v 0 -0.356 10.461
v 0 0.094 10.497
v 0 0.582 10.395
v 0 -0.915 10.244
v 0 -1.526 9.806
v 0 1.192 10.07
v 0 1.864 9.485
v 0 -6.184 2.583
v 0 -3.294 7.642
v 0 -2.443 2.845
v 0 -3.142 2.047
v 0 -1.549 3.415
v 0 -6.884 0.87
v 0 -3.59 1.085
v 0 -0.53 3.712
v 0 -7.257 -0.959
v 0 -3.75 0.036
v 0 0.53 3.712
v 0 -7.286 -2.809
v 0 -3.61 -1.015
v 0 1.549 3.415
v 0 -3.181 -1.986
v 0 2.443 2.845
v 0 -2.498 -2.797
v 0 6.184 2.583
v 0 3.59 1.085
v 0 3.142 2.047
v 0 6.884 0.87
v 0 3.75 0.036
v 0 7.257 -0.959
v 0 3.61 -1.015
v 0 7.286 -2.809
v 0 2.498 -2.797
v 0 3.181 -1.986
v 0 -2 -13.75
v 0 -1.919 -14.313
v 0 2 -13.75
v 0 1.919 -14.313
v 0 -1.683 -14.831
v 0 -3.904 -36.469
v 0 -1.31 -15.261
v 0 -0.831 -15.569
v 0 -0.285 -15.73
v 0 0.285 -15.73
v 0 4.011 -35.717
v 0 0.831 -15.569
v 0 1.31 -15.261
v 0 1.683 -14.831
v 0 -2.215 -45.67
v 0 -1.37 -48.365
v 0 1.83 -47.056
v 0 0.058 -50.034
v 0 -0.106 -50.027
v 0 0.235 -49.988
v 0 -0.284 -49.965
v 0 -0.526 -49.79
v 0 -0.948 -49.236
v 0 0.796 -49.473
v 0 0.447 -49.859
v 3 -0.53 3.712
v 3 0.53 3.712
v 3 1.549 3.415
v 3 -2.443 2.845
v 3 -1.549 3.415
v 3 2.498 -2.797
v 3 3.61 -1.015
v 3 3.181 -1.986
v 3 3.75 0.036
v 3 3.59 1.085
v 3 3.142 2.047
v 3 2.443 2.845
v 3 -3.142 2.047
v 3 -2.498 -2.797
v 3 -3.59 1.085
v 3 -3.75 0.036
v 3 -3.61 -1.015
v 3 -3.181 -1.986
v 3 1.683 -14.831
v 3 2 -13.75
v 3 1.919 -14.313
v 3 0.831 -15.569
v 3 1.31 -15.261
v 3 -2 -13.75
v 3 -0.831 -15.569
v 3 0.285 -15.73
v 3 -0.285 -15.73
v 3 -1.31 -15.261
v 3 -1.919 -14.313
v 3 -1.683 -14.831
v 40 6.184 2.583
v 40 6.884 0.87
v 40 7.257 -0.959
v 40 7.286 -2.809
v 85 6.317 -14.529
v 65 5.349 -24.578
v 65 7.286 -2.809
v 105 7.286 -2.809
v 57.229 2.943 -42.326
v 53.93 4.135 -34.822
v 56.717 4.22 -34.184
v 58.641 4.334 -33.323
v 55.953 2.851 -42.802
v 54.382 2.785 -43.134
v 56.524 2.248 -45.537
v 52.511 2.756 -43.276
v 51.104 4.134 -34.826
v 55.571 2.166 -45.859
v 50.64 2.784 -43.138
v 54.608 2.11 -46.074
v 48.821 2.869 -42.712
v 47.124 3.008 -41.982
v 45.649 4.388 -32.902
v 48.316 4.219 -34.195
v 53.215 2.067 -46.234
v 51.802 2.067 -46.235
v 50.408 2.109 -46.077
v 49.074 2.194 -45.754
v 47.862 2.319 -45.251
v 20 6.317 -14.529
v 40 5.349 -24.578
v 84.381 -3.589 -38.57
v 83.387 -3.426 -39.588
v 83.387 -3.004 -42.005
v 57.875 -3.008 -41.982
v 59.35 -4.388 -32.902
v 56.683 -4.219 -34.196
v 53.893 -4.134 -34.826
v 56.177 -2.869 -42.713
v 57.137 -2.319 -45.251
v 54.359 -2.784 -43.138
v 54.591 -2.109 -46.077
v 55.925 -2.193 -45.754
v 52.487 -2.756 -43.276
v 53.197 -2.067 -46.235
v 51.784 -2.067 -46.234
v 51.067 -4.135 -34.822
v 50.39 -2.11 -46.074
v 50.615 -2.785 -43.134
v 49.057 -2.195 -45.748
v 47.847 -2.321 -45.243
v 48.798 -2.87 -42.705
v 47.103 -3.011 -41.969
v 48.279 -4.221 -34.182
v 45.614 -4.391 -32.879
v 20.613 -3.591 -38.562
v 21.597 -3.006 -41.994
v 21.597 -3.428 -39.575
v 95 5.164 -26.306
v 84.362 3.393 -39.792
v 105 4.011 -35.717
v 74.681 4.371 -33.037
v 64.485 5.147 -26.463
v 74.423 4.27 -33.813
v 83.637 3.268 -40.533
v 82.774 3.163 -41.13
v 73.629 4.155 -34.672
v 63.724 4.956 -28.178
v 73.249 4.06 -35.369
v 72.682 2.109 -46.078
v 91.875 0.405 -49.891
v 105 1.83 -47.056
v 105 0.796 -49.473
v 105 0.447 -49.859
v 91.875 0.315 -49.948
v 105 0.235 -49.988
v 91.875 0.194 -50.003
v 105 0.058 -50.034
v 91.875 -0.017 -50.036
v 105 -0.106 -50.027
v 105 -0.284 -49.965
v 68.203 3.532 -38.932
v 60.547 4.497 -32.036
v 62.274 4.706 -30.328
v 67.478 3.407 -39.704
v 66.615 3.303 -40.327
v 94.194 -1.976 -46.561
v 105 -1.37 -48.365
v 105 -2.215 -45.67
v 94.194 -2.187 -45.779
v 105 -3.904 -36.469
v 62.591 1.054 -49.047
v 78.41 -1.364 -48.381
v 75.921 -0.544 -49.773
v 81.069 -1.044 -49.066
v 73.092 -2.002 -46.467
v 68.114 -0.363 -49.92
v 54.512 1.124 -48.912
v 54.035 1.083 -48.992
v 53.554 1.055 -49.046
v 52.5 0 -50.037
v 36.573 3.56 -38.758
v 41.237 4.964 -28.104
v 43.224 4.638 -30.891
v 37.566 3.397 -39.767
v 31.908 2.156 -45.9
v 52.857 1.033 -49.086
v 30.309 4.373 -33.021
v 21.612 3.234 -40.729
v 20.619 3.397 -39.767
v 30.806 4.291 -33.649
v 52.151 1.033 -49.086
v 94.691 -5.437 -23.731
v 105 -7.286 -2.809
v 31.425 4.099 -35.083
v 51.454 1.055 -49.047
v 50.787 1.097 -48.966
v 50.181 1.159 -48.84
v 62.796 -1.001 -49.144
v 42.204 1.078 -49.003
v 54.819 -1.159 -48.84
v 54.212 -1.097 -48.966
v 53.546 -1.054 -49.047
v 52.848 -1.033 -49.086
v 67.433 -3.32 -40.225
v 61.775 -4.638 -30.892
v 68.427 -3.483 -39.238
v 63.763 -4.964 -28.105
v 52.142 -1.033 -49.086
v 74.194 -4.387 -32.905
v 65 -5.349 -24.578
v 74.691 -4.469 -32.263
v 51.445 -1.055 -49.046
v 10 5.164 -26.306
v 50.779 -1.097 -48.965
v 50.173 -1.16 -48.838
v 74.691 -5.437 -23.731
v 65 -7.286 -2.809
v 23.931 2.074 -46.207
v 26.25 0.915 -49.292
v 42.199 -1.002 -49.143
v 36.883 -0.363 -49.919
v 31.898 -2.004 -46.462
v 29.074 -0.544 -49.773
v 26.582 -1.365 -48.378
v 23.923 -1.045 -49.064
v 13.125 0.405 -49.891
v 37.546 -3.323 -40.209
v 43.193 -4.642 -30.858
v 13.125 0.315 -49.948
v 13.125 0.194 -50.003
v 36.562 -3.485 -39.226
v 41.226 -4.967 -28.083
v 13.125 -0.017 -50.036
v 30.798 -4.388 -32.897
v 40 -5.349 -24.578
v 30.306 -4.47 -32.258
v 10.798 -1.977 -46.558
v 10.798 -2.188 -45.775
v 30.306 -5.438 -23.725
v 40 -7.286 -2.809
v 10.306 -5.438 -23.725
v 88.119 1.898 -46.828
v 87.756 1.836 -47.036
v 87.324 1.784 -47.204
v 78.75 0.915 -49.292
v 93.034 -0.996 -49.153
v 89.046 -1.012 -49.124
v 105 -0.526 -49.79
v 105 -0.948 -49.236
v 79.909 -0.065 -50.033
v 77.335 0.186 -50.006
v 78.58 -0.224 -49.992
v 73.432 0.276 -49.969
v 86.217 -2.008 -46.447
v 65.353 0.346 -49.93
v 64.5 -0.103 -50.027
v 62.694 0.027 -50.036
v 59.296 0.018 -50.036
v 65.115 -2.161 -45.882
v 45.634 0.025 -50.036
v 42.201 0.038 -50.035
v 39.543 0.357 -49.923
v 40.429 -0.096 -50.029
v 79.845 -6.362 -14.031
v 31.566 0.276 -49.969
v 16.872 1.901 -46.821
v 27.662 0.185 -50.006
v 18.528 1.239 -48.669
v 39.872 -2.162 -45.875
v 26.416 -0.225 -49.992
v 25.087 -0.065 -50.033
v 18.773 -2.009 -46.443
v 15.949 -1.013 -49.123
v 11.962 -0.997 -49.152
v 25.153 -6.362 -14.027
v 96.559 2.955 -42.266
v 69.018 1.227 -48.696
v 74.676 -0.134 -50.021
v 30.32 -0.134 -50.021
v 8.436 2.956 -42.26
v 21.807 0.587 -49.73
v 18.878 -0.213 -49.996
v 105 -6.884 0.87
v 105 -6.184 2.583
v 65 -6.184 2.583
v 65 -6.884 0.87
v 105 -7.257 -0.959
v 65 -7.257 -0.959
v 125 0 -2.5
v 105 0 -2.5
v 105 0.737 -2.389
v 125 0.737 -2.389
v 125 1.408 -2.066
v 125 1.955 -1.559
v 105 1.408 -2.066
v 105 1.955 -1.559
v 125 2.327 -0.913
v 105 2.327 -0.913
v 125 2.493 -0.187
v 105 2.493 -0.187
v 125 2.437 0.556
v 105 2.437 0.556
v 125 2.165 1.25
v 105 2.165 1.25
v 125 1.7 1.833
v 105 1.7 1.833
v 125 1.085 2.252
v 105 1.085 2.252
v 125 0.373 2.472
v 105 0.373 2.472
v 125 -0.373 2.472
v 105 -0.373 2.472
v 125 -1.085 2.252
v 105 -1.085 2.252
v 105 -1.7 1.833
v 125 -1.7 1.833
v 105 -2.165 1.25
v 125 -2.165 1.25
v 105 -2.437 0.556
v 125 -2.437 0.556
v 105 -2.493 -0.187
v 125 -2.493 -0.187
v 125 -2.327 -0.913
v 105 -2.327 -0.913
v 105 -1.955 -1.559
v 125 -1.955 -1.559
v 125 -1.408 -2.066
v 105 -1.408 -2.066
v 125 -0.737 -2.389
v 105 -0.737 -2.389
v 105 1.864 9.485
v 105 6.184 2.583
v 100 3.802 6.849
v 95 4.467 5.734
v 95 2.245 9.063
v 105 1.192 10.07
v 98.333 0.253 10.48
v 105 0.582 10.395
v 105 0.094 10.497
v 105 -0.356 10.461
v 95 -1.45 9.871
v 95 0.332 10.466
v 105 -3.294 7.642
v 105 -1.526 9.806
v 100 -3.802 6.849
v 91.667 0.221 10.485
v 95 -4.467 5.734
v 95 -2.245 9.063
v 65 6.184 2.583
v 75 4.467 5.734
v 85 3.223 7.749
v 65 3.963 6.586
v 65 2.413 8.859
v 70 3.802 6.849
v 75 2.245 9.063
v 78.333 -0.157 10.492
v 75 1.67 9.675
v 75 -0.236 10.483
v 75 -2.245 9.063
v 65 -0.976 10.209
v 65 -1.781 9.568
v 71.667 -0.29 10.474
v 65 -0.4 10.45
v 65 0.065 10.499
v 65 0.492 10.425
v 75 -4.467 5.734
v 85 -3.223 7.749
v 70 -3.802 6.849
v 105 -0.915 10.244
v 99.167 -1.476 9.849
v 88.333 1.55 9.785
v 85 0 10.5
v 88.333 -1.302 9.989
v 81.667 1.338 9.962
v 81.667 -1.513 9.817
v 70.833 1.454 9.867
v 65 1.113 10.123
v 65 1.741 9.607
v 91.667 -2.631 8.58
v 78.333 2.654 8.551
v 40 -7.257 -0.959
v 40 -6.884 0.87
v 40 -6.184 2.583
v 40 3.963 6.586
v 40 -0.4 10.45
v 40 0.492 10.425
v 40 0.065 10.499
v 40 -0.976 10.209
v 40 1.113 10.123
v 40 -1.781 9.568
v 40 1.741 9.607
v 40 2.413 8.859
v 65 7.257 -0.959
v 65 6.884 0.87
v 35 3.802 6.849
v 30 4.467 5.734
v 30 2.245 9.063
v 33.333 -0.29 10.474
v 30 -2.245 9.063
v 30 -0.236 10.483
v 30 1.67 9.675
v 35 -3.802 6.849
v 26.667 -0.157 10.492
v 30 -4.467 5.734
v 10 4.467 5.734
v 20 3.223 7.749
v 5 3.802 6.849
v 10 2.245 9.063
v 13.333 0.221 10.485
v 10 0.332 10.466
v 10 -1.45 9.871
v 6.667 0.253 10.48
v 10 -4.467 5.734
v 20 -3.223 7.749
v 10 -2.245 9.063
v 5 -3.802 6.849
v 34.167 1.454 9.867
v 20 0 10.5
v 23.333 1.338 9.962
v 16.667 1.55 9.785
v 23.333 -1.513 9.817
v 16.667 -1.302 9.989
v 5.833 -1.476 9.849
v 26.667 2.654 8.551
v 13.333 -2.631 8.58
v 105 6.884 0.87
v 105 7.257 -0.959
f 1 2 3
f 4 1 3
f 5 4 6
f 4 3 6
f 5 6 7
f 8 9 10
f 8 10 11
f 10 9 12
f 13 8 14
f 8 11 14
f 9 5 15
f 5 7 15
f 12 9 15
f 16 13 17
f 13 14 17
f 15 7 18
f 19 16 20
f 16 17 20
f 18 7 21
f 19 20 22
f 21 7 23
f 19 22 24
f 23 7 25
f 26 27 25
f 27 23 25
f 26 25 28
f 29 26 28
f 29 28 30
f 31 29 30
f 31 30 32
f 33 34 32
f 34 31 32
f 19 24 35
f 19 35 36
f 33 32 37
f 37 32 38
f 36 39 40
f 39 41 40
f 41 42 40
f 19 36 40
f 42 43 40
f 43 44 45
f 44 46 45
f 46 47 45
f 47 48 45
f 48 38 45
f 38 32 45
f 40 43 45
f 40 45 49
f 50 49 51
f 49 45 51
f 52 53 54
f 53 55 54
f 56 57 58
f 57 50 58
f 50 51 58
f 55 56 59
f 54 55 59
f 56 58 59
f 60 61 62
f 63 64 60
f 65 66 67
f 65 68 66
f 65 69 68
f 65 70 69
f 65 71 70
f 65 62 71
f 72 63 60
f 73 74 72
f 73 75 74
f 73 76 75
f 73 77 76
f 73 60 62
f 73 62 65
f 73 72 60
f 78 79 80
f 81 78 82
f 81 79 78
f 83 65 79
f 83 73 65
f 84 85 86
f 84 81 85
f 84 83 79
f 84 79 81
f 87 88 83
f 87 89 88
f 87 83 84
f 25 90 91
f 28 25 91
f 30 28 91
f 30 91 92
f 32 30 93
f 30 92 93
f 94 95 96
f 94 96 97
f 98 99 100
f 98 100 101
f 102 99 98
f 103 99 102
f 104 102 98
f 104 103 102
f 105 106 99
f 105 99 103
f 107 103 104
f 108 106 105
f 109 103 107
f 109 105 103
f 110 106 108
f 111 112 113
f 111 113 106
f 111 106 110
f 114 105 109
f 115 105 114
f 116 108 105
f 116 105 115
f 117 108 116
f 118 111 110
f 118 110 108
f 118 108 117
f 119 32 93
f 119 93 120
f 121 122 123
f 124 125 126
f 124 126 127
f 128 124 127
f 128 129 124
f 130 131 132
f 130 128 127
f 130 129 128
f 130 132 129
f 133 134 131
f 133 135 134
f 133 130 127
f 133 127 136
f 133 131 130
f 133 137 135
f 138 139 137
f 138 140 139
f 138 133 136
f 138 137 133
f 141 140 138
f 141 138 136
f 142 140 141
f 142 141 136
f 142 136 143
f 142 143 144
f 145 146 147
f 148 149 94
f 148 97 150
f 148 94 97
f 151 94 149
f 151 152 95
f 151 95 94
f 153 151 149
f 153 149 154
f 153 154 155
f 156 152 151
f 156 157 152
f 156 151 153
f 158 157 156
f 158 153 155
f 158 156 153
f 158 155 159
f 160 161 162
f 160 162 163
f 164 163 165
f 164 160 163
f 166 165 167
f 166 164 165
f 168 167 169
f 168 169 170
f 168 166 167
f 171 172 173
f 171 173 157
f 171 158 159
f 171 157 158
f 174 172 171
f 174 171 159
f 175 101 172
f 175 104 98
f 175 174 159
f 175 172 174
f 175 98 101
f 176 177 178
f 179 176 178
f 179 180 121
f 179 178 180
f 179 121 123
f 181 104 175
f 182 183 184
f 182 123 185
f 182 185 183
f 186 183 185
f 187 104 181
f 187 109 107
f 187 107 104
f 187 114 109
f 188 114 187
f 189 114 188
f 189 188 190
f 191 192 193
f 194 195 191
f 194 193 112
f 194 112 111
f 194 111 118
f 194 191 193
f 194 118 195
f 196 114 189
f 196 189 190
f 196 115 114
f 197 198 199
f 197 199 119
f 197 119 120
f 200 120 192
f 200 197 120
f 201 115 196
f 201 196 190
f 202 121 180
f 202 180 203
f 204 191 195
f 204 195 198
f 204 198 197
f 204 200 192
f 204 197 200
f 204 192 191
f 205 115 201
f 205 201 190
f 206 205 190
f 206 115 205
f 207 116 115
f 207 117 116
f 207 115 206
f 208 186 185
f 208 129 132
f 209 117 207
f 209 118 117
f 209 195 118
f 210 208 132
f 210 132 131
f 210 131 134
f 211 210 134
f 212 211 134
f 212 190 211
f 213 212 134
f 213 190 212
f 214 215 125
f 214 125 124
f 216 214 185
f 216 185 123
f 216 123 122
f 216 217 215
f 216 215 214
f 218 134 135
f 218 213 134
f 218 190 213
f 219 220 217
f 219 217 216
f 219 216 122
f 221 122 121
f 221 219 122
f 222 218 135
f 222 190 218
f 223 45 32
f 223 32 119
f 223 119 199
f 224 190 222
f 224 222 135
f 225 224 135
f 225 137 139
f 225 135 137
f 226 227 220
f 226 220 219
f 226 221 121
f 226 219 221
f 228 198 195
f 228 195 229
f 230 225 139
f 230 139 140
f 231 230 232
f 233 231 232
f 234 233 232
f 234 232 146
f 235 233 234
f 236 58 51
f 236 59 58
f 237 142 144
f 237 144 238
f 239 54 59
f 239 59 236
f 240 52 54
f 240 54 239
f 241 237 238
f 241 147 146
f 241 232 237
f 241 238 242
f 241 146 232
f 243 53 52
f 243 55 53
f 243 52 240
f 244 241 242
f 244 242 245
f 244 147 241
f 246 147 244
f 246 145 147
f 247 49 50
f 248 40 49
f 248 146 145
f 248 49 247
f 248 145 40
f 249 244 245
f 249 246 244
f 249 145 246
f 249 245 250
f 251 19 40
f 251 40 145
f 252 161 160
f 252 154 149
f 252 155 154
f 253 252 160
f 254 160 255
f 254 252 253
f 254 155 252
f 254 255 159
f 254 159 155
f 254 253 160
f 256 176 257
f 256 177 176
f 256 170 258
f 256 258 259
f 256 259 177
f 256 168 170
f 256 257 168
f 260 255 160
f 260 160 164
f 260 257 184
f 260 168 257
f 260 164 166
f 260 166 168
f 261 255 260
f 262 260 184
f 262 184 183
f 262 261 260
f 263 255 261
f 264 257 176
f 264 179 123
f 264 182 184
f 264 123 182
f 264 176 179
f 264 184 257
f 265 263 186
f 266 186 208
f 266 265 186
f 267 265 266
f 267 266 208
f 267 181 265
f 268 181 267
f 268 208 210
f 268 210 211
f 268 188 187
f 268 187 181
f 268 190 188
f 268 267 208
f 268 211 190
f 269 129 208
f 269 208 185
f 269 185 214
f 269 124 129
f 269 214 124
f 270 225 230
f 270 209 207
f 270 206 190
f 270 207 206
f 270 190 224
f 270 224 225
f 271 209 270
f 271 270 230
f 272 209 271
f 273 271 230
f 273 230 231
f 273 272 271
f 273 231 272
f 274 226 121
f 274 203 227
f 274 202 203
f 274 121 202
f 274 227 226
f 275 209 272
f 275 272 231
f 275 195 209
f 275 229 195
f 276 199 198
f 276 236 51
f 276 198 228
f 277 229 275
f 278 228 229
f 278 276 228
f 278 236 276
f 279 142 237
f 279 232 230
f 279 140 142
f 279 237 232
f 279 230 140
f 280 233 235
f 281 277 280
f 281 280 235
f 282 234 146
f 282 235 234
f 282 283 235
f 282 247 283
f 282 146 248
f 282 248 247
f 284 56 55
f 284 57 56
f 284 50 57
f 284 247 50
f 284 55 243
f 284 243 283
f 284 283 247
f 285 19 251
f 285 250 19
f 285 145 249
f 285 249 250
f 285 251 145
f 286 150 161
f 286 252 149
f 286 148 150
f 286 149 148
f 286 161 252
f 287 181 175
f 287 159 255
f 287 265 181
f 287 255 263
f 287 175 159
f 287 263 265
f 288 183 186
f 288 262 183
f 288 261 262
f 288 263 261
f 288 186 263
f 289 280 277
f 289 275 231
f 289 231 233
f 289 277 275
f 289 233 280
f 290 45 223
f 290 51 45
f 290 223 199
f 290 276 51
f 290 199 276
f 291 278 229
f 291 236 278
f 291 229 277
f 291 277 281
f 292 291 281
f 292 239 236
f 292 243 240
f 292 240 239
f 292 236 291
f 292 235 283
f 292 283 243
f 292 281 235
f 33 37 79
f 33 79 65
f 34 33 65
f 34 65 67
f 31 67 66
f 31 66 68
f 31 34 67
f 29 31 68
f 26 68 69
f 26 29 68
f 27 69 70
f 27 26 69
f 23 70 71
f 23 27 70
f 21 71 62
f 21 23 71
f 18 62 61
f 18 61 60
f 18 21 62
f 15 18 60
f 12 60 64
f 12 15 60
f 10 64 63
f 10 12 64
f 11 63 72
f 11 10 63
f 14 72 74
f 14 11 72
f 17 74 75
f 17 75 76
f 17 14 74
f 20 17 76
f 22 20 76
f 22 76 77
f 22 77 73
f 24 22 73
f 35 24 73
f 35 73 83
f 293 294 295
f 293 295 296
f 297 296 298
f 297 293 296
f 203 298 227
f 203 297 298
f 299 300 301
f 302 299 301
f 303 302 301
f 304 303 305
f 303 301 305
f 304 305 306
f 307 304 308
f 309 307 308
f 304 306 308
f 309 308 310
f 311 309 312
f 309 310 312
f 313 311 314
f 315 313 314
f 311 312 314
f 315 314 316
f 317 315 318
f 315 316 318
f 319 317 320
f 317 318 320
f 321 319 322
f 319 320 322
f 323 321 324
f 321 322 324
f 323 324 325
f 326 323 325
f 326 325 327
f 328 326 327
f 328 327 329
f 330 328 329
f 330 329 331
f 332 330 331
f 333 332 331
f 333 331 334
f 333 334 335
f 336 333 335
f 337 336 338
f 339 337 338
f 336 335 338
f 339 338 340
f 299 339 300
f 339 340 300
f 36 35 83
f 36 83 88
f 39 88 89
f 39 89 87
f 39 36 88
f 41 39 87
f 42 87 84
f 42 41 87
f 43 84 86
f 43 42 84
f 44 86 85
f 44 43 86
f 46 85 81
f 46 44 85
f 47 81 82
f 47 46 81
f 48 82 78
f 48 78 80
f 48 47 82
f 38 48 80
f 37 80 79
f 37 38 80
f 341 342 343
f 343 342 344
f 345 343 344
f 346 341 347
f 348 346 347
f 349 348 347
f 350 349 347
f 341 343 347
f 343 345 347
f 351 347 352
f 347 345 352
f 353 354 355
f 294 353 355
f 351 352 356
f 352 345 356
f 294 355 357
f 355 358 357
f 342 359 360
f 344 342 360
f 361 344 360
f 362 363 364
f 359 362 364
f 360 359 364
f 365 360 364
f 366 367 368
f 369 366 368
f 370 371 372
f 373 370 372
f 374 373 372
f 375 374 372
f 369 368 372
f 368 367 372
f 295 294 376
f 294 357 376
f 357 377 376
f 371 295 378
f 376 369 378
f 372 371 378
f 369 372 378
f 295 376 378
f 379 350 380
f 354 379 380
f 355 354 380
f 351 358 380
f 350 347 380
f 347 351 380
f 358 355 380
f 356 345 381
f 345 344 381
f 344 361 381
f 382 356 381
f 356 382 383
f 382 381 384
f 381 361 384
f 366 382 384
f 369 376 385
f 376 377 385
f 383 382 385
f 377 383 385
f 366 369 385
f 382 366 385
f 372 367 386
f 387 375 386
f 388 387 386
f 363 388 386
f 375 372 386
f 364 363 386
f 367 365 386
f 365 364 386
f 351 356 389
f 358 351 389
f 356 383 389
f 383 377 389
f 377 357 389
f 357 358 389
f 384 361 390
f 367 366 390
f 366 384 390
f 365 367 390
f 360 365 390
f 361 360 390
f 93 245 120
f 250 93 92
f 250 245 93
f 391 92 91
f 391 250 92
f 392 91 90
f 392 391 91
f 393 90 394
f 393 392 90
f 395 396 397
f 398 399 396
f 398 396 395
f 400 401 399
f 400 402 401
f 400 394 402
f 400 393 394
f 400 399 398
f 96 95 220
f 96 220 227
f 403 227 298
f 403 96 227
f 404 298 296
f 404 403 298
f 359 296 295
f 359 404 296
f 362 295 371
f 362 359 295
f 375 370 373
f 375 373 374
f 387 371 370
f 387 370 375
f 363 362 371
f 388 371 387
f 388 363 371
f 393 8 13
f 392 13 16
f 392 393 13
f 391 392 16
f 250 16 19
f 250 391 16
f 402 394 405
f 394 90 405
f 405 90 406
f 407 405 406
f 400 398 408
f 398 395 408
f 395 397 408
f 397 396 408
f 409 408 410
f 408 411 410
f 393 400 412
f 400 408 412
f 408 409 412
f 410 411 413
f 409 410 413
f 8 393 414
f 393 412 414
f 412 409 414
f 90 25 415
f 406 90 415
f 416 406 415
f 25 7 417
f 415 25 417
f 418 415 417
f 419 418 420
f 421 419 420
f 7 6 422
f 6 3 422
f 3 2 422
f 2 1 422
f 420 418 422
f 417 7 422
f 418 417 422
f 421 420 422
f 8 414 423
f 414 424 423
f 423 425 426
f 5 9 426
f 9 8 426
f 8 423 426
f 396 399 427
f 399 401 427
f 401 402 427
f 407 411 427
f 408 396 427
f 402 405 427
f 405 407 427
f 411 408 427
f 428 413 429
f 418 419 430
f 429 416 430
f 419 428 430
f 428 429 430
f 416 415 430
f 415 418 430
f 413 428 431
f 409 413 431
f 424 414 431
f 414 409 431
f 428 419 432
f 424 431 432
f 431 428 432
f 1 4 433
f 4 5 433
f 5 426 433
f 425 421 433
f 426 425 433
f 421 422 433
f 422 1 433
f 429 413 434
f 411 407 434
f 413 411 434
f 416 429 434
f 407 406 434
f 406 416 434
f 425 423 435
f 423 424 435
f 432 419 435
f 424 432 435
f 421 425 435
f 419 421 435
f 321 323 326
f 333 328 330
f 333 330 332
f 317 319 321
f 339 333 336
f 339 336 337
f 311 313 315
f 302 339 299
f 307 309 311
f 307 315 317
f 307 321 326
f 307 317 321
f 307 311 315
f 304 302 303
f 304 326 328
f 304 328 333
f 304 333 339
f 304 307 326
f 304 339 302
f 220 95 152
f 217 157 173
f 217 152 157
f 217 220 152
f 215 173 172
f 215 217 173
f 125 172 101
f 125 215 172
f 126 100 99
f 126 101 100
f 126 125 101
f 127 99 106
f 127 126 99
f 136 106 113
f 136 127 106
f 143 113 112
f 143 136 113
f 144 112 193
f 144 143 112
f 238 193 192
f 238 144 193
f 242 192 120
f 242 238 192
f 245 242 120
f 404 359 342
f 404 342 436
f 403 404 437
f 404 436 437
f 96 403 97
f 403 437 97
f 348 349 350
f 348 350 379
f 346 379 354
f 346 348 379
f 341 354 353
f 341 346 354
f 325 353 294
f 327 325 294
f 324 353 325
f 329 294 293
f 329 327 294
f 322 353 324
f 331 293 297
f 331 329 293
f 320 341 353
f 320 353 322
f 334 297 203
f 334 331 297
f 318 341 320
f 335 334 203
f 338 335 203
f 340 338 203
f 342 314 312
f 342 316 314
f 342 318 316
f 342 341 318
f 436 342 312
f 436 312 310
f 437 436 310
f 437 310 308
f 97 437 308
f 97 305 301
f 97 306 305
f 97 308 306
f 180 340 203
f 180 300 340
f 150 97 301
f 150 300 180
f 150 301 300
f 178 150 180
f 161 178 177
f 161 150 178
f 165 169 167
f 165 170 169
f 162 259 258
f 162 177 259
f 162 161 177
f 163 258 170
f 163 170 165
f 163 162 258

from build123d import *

# Parameters (mm, degrees)
SKETCH1_R               = 1.5
BOSS_EXTRUDE1_DEPTH     = 105
FILLET1_R               = 10
CUT_EXTRUDE1_DEPTH      = 117.542660484
CUT_EXTRUDE1_DEPTH_BACK = 117.542660484
CAVITY1_DEPTH           = 3
SKETCH3_R               = 2.5
SKETCH3_R_2             = 1.5
BOSS_EXTRUDE2_DEPTH     = 20
SKETCH5_R               = 1.5
BOSS_EXTRUDE4_DEPTH     = 37
BOSS_EXTRUDE5_START     = -62
SKETCH5_2_R             = 1.5
BOSS_EXTRUDE5_DEPTH     = 40


# Read off the part's stored shape, not the designer's step: Cavity1
with BuildPart() as part:
    # Sketch1 → Boss-Extrude1 (new body)
    with BuildSketch(Plane(origin=(0, 0, 0), x_dir=(0, 0, -1), z_dir=(1, 0, 0))):
        with BuildLine():
            add(Edge.make_bspline(
                [(3.73e-07, 7.5), (-15, 0), (-3.73e-07, -7.5)],
                knots=[0, 0, 0, 1, 1, 1], degree=2, weights=[1, 2.333333333, 1]))
            add(Edge.make_bspline(
                [(3.73e-07, 7.5), (100, 0), (-3.73e-07, -7.5)],
                knots=[0, 0, 0, 1, 1, 1], degree=2, weights=[1, 1.001467765, 1]))
        make_face()
        Circle(SKETCH1_R, mode=Mode.SUBTRACT)
    extrude(amount=BOSS_EXTRUDE1_DEPTH)

    # Fillet1
    fillet1_edges = [part.edges().sort_by_distance(p)[0] for p in [
        (52.5, -7.5, 3.73e-07),
        (52.5, 7.5, -3.73e-07),
    ]]
    fillet(fillet1_edges, radius=FILLET1_R)

    # Sketch2 → Cut-Extrude1 (cut, two sides: drawn at the far end of the back side and taken through both)
    with BuildSketch(Plane(origin=(0, 0, 0), x_dir=(1, 0, 0), z_dir=(0, 1, 0)).offset(-CUT_EXTRUDE1_DEPTH_BACK)):
        with BuildLine():
            Line((65, 19.76833361), (65, 24.578179161))
            ThreePointArc((65, 24.578179161), (52.5, 34.902500415), (40, 24.578179161))
            Line((40, 24.578179161), (40, 19.76833361))
            Line((40, 19.76833361), (40, 14.958488059))
            ThreePointArc((40, 14.958488059), (52.5, 4.634166805), (65, 14.958488059))
            Line((65, 14.958488059), (65, 19.76833361))
        make_face()
        with BuildLine():
            Line((40, -10.5), (65, -10.5))
            Line((65, -10.5), (65, 14.958488059))
            ThreePointArc((65, 14.958488059), (52.5, 4.634166805), (40, 14.958488059))
            Line((40, 14.958488059), (40, -10.5))
        make_face()
    extrude(amount=CUT_EXTRUDE1_DEPTH + CUT_EXTRUDE1_DEPTH_BACK, mode=Mode.SUBTRACT)

    # Cavity1 outline → Cavity1 (cut)
    with BuildSketch(Plane.YZ):
        with BuildLine():
            ThreePointArc((-2, -13.75), (0, -15.75), (2, -13.75))
            Line((2, -13.75), (2.497863905, -2.796994085))
            ThreePointArc((2.497863905, -2.796994085), (0, 3.75), (-2.497863905, -2.796994085))
            Line((-2.497863905, -2.796994085), (-2, -13.75))
        make_face()
    extrude(amount=CAVITY1_DEPTH, mode=Mode.SUBTRACT)

    # Sketch3 → Boss-Extrude2 (add)
    # profile 1 of 2: a face of its own
    with BuildSketch(Plane(origin=(105, 0, 0), x_dir=(0, 0, -1), z_dir=(1, 0, 0))):
        Circle(SKETCH3_R)
        with Locations(Location((0, 0, 0), (0, 0, 180))):
            Circle(SKETCH3_R_2, mode=Mode.SUBTRACT)
    # profile 2 of 2: a face of its own
    with BuildSketch(Plane(origin=(105, 0, 0), x_dir=(0, 0, -1), z_dir=(1, 0, 0))):
        with Locations(Location((0, 0, 0), (0, 0, 180))):
            Circle(SKETCH3_R_2)
    extrude(amount=BOSS_EXTRUDE2_DEPTH)

    # Sketch5 → Boss-Extrude4 (add)
    with BuildSketch(Plane.ZY.offset(-3)):
        with Locations(Location((0, 0, 0), (0, 0, 180))):
            Circle(SKETCH5_R)
    extrude(amount=-BOSS_EXTRUDE4_DEPTH)

    # Sketch5<2> → Boss-Extrude5 (add)
    with BuildSketch(Plane.ZY.offset(-3).offset(BOSS_EXTRUDE5_START)):
        Circle(SKETCH5_2_R)
    extrude(amount=-BOSS_EXTRUDE5_DEPTH)


solid = part.part
